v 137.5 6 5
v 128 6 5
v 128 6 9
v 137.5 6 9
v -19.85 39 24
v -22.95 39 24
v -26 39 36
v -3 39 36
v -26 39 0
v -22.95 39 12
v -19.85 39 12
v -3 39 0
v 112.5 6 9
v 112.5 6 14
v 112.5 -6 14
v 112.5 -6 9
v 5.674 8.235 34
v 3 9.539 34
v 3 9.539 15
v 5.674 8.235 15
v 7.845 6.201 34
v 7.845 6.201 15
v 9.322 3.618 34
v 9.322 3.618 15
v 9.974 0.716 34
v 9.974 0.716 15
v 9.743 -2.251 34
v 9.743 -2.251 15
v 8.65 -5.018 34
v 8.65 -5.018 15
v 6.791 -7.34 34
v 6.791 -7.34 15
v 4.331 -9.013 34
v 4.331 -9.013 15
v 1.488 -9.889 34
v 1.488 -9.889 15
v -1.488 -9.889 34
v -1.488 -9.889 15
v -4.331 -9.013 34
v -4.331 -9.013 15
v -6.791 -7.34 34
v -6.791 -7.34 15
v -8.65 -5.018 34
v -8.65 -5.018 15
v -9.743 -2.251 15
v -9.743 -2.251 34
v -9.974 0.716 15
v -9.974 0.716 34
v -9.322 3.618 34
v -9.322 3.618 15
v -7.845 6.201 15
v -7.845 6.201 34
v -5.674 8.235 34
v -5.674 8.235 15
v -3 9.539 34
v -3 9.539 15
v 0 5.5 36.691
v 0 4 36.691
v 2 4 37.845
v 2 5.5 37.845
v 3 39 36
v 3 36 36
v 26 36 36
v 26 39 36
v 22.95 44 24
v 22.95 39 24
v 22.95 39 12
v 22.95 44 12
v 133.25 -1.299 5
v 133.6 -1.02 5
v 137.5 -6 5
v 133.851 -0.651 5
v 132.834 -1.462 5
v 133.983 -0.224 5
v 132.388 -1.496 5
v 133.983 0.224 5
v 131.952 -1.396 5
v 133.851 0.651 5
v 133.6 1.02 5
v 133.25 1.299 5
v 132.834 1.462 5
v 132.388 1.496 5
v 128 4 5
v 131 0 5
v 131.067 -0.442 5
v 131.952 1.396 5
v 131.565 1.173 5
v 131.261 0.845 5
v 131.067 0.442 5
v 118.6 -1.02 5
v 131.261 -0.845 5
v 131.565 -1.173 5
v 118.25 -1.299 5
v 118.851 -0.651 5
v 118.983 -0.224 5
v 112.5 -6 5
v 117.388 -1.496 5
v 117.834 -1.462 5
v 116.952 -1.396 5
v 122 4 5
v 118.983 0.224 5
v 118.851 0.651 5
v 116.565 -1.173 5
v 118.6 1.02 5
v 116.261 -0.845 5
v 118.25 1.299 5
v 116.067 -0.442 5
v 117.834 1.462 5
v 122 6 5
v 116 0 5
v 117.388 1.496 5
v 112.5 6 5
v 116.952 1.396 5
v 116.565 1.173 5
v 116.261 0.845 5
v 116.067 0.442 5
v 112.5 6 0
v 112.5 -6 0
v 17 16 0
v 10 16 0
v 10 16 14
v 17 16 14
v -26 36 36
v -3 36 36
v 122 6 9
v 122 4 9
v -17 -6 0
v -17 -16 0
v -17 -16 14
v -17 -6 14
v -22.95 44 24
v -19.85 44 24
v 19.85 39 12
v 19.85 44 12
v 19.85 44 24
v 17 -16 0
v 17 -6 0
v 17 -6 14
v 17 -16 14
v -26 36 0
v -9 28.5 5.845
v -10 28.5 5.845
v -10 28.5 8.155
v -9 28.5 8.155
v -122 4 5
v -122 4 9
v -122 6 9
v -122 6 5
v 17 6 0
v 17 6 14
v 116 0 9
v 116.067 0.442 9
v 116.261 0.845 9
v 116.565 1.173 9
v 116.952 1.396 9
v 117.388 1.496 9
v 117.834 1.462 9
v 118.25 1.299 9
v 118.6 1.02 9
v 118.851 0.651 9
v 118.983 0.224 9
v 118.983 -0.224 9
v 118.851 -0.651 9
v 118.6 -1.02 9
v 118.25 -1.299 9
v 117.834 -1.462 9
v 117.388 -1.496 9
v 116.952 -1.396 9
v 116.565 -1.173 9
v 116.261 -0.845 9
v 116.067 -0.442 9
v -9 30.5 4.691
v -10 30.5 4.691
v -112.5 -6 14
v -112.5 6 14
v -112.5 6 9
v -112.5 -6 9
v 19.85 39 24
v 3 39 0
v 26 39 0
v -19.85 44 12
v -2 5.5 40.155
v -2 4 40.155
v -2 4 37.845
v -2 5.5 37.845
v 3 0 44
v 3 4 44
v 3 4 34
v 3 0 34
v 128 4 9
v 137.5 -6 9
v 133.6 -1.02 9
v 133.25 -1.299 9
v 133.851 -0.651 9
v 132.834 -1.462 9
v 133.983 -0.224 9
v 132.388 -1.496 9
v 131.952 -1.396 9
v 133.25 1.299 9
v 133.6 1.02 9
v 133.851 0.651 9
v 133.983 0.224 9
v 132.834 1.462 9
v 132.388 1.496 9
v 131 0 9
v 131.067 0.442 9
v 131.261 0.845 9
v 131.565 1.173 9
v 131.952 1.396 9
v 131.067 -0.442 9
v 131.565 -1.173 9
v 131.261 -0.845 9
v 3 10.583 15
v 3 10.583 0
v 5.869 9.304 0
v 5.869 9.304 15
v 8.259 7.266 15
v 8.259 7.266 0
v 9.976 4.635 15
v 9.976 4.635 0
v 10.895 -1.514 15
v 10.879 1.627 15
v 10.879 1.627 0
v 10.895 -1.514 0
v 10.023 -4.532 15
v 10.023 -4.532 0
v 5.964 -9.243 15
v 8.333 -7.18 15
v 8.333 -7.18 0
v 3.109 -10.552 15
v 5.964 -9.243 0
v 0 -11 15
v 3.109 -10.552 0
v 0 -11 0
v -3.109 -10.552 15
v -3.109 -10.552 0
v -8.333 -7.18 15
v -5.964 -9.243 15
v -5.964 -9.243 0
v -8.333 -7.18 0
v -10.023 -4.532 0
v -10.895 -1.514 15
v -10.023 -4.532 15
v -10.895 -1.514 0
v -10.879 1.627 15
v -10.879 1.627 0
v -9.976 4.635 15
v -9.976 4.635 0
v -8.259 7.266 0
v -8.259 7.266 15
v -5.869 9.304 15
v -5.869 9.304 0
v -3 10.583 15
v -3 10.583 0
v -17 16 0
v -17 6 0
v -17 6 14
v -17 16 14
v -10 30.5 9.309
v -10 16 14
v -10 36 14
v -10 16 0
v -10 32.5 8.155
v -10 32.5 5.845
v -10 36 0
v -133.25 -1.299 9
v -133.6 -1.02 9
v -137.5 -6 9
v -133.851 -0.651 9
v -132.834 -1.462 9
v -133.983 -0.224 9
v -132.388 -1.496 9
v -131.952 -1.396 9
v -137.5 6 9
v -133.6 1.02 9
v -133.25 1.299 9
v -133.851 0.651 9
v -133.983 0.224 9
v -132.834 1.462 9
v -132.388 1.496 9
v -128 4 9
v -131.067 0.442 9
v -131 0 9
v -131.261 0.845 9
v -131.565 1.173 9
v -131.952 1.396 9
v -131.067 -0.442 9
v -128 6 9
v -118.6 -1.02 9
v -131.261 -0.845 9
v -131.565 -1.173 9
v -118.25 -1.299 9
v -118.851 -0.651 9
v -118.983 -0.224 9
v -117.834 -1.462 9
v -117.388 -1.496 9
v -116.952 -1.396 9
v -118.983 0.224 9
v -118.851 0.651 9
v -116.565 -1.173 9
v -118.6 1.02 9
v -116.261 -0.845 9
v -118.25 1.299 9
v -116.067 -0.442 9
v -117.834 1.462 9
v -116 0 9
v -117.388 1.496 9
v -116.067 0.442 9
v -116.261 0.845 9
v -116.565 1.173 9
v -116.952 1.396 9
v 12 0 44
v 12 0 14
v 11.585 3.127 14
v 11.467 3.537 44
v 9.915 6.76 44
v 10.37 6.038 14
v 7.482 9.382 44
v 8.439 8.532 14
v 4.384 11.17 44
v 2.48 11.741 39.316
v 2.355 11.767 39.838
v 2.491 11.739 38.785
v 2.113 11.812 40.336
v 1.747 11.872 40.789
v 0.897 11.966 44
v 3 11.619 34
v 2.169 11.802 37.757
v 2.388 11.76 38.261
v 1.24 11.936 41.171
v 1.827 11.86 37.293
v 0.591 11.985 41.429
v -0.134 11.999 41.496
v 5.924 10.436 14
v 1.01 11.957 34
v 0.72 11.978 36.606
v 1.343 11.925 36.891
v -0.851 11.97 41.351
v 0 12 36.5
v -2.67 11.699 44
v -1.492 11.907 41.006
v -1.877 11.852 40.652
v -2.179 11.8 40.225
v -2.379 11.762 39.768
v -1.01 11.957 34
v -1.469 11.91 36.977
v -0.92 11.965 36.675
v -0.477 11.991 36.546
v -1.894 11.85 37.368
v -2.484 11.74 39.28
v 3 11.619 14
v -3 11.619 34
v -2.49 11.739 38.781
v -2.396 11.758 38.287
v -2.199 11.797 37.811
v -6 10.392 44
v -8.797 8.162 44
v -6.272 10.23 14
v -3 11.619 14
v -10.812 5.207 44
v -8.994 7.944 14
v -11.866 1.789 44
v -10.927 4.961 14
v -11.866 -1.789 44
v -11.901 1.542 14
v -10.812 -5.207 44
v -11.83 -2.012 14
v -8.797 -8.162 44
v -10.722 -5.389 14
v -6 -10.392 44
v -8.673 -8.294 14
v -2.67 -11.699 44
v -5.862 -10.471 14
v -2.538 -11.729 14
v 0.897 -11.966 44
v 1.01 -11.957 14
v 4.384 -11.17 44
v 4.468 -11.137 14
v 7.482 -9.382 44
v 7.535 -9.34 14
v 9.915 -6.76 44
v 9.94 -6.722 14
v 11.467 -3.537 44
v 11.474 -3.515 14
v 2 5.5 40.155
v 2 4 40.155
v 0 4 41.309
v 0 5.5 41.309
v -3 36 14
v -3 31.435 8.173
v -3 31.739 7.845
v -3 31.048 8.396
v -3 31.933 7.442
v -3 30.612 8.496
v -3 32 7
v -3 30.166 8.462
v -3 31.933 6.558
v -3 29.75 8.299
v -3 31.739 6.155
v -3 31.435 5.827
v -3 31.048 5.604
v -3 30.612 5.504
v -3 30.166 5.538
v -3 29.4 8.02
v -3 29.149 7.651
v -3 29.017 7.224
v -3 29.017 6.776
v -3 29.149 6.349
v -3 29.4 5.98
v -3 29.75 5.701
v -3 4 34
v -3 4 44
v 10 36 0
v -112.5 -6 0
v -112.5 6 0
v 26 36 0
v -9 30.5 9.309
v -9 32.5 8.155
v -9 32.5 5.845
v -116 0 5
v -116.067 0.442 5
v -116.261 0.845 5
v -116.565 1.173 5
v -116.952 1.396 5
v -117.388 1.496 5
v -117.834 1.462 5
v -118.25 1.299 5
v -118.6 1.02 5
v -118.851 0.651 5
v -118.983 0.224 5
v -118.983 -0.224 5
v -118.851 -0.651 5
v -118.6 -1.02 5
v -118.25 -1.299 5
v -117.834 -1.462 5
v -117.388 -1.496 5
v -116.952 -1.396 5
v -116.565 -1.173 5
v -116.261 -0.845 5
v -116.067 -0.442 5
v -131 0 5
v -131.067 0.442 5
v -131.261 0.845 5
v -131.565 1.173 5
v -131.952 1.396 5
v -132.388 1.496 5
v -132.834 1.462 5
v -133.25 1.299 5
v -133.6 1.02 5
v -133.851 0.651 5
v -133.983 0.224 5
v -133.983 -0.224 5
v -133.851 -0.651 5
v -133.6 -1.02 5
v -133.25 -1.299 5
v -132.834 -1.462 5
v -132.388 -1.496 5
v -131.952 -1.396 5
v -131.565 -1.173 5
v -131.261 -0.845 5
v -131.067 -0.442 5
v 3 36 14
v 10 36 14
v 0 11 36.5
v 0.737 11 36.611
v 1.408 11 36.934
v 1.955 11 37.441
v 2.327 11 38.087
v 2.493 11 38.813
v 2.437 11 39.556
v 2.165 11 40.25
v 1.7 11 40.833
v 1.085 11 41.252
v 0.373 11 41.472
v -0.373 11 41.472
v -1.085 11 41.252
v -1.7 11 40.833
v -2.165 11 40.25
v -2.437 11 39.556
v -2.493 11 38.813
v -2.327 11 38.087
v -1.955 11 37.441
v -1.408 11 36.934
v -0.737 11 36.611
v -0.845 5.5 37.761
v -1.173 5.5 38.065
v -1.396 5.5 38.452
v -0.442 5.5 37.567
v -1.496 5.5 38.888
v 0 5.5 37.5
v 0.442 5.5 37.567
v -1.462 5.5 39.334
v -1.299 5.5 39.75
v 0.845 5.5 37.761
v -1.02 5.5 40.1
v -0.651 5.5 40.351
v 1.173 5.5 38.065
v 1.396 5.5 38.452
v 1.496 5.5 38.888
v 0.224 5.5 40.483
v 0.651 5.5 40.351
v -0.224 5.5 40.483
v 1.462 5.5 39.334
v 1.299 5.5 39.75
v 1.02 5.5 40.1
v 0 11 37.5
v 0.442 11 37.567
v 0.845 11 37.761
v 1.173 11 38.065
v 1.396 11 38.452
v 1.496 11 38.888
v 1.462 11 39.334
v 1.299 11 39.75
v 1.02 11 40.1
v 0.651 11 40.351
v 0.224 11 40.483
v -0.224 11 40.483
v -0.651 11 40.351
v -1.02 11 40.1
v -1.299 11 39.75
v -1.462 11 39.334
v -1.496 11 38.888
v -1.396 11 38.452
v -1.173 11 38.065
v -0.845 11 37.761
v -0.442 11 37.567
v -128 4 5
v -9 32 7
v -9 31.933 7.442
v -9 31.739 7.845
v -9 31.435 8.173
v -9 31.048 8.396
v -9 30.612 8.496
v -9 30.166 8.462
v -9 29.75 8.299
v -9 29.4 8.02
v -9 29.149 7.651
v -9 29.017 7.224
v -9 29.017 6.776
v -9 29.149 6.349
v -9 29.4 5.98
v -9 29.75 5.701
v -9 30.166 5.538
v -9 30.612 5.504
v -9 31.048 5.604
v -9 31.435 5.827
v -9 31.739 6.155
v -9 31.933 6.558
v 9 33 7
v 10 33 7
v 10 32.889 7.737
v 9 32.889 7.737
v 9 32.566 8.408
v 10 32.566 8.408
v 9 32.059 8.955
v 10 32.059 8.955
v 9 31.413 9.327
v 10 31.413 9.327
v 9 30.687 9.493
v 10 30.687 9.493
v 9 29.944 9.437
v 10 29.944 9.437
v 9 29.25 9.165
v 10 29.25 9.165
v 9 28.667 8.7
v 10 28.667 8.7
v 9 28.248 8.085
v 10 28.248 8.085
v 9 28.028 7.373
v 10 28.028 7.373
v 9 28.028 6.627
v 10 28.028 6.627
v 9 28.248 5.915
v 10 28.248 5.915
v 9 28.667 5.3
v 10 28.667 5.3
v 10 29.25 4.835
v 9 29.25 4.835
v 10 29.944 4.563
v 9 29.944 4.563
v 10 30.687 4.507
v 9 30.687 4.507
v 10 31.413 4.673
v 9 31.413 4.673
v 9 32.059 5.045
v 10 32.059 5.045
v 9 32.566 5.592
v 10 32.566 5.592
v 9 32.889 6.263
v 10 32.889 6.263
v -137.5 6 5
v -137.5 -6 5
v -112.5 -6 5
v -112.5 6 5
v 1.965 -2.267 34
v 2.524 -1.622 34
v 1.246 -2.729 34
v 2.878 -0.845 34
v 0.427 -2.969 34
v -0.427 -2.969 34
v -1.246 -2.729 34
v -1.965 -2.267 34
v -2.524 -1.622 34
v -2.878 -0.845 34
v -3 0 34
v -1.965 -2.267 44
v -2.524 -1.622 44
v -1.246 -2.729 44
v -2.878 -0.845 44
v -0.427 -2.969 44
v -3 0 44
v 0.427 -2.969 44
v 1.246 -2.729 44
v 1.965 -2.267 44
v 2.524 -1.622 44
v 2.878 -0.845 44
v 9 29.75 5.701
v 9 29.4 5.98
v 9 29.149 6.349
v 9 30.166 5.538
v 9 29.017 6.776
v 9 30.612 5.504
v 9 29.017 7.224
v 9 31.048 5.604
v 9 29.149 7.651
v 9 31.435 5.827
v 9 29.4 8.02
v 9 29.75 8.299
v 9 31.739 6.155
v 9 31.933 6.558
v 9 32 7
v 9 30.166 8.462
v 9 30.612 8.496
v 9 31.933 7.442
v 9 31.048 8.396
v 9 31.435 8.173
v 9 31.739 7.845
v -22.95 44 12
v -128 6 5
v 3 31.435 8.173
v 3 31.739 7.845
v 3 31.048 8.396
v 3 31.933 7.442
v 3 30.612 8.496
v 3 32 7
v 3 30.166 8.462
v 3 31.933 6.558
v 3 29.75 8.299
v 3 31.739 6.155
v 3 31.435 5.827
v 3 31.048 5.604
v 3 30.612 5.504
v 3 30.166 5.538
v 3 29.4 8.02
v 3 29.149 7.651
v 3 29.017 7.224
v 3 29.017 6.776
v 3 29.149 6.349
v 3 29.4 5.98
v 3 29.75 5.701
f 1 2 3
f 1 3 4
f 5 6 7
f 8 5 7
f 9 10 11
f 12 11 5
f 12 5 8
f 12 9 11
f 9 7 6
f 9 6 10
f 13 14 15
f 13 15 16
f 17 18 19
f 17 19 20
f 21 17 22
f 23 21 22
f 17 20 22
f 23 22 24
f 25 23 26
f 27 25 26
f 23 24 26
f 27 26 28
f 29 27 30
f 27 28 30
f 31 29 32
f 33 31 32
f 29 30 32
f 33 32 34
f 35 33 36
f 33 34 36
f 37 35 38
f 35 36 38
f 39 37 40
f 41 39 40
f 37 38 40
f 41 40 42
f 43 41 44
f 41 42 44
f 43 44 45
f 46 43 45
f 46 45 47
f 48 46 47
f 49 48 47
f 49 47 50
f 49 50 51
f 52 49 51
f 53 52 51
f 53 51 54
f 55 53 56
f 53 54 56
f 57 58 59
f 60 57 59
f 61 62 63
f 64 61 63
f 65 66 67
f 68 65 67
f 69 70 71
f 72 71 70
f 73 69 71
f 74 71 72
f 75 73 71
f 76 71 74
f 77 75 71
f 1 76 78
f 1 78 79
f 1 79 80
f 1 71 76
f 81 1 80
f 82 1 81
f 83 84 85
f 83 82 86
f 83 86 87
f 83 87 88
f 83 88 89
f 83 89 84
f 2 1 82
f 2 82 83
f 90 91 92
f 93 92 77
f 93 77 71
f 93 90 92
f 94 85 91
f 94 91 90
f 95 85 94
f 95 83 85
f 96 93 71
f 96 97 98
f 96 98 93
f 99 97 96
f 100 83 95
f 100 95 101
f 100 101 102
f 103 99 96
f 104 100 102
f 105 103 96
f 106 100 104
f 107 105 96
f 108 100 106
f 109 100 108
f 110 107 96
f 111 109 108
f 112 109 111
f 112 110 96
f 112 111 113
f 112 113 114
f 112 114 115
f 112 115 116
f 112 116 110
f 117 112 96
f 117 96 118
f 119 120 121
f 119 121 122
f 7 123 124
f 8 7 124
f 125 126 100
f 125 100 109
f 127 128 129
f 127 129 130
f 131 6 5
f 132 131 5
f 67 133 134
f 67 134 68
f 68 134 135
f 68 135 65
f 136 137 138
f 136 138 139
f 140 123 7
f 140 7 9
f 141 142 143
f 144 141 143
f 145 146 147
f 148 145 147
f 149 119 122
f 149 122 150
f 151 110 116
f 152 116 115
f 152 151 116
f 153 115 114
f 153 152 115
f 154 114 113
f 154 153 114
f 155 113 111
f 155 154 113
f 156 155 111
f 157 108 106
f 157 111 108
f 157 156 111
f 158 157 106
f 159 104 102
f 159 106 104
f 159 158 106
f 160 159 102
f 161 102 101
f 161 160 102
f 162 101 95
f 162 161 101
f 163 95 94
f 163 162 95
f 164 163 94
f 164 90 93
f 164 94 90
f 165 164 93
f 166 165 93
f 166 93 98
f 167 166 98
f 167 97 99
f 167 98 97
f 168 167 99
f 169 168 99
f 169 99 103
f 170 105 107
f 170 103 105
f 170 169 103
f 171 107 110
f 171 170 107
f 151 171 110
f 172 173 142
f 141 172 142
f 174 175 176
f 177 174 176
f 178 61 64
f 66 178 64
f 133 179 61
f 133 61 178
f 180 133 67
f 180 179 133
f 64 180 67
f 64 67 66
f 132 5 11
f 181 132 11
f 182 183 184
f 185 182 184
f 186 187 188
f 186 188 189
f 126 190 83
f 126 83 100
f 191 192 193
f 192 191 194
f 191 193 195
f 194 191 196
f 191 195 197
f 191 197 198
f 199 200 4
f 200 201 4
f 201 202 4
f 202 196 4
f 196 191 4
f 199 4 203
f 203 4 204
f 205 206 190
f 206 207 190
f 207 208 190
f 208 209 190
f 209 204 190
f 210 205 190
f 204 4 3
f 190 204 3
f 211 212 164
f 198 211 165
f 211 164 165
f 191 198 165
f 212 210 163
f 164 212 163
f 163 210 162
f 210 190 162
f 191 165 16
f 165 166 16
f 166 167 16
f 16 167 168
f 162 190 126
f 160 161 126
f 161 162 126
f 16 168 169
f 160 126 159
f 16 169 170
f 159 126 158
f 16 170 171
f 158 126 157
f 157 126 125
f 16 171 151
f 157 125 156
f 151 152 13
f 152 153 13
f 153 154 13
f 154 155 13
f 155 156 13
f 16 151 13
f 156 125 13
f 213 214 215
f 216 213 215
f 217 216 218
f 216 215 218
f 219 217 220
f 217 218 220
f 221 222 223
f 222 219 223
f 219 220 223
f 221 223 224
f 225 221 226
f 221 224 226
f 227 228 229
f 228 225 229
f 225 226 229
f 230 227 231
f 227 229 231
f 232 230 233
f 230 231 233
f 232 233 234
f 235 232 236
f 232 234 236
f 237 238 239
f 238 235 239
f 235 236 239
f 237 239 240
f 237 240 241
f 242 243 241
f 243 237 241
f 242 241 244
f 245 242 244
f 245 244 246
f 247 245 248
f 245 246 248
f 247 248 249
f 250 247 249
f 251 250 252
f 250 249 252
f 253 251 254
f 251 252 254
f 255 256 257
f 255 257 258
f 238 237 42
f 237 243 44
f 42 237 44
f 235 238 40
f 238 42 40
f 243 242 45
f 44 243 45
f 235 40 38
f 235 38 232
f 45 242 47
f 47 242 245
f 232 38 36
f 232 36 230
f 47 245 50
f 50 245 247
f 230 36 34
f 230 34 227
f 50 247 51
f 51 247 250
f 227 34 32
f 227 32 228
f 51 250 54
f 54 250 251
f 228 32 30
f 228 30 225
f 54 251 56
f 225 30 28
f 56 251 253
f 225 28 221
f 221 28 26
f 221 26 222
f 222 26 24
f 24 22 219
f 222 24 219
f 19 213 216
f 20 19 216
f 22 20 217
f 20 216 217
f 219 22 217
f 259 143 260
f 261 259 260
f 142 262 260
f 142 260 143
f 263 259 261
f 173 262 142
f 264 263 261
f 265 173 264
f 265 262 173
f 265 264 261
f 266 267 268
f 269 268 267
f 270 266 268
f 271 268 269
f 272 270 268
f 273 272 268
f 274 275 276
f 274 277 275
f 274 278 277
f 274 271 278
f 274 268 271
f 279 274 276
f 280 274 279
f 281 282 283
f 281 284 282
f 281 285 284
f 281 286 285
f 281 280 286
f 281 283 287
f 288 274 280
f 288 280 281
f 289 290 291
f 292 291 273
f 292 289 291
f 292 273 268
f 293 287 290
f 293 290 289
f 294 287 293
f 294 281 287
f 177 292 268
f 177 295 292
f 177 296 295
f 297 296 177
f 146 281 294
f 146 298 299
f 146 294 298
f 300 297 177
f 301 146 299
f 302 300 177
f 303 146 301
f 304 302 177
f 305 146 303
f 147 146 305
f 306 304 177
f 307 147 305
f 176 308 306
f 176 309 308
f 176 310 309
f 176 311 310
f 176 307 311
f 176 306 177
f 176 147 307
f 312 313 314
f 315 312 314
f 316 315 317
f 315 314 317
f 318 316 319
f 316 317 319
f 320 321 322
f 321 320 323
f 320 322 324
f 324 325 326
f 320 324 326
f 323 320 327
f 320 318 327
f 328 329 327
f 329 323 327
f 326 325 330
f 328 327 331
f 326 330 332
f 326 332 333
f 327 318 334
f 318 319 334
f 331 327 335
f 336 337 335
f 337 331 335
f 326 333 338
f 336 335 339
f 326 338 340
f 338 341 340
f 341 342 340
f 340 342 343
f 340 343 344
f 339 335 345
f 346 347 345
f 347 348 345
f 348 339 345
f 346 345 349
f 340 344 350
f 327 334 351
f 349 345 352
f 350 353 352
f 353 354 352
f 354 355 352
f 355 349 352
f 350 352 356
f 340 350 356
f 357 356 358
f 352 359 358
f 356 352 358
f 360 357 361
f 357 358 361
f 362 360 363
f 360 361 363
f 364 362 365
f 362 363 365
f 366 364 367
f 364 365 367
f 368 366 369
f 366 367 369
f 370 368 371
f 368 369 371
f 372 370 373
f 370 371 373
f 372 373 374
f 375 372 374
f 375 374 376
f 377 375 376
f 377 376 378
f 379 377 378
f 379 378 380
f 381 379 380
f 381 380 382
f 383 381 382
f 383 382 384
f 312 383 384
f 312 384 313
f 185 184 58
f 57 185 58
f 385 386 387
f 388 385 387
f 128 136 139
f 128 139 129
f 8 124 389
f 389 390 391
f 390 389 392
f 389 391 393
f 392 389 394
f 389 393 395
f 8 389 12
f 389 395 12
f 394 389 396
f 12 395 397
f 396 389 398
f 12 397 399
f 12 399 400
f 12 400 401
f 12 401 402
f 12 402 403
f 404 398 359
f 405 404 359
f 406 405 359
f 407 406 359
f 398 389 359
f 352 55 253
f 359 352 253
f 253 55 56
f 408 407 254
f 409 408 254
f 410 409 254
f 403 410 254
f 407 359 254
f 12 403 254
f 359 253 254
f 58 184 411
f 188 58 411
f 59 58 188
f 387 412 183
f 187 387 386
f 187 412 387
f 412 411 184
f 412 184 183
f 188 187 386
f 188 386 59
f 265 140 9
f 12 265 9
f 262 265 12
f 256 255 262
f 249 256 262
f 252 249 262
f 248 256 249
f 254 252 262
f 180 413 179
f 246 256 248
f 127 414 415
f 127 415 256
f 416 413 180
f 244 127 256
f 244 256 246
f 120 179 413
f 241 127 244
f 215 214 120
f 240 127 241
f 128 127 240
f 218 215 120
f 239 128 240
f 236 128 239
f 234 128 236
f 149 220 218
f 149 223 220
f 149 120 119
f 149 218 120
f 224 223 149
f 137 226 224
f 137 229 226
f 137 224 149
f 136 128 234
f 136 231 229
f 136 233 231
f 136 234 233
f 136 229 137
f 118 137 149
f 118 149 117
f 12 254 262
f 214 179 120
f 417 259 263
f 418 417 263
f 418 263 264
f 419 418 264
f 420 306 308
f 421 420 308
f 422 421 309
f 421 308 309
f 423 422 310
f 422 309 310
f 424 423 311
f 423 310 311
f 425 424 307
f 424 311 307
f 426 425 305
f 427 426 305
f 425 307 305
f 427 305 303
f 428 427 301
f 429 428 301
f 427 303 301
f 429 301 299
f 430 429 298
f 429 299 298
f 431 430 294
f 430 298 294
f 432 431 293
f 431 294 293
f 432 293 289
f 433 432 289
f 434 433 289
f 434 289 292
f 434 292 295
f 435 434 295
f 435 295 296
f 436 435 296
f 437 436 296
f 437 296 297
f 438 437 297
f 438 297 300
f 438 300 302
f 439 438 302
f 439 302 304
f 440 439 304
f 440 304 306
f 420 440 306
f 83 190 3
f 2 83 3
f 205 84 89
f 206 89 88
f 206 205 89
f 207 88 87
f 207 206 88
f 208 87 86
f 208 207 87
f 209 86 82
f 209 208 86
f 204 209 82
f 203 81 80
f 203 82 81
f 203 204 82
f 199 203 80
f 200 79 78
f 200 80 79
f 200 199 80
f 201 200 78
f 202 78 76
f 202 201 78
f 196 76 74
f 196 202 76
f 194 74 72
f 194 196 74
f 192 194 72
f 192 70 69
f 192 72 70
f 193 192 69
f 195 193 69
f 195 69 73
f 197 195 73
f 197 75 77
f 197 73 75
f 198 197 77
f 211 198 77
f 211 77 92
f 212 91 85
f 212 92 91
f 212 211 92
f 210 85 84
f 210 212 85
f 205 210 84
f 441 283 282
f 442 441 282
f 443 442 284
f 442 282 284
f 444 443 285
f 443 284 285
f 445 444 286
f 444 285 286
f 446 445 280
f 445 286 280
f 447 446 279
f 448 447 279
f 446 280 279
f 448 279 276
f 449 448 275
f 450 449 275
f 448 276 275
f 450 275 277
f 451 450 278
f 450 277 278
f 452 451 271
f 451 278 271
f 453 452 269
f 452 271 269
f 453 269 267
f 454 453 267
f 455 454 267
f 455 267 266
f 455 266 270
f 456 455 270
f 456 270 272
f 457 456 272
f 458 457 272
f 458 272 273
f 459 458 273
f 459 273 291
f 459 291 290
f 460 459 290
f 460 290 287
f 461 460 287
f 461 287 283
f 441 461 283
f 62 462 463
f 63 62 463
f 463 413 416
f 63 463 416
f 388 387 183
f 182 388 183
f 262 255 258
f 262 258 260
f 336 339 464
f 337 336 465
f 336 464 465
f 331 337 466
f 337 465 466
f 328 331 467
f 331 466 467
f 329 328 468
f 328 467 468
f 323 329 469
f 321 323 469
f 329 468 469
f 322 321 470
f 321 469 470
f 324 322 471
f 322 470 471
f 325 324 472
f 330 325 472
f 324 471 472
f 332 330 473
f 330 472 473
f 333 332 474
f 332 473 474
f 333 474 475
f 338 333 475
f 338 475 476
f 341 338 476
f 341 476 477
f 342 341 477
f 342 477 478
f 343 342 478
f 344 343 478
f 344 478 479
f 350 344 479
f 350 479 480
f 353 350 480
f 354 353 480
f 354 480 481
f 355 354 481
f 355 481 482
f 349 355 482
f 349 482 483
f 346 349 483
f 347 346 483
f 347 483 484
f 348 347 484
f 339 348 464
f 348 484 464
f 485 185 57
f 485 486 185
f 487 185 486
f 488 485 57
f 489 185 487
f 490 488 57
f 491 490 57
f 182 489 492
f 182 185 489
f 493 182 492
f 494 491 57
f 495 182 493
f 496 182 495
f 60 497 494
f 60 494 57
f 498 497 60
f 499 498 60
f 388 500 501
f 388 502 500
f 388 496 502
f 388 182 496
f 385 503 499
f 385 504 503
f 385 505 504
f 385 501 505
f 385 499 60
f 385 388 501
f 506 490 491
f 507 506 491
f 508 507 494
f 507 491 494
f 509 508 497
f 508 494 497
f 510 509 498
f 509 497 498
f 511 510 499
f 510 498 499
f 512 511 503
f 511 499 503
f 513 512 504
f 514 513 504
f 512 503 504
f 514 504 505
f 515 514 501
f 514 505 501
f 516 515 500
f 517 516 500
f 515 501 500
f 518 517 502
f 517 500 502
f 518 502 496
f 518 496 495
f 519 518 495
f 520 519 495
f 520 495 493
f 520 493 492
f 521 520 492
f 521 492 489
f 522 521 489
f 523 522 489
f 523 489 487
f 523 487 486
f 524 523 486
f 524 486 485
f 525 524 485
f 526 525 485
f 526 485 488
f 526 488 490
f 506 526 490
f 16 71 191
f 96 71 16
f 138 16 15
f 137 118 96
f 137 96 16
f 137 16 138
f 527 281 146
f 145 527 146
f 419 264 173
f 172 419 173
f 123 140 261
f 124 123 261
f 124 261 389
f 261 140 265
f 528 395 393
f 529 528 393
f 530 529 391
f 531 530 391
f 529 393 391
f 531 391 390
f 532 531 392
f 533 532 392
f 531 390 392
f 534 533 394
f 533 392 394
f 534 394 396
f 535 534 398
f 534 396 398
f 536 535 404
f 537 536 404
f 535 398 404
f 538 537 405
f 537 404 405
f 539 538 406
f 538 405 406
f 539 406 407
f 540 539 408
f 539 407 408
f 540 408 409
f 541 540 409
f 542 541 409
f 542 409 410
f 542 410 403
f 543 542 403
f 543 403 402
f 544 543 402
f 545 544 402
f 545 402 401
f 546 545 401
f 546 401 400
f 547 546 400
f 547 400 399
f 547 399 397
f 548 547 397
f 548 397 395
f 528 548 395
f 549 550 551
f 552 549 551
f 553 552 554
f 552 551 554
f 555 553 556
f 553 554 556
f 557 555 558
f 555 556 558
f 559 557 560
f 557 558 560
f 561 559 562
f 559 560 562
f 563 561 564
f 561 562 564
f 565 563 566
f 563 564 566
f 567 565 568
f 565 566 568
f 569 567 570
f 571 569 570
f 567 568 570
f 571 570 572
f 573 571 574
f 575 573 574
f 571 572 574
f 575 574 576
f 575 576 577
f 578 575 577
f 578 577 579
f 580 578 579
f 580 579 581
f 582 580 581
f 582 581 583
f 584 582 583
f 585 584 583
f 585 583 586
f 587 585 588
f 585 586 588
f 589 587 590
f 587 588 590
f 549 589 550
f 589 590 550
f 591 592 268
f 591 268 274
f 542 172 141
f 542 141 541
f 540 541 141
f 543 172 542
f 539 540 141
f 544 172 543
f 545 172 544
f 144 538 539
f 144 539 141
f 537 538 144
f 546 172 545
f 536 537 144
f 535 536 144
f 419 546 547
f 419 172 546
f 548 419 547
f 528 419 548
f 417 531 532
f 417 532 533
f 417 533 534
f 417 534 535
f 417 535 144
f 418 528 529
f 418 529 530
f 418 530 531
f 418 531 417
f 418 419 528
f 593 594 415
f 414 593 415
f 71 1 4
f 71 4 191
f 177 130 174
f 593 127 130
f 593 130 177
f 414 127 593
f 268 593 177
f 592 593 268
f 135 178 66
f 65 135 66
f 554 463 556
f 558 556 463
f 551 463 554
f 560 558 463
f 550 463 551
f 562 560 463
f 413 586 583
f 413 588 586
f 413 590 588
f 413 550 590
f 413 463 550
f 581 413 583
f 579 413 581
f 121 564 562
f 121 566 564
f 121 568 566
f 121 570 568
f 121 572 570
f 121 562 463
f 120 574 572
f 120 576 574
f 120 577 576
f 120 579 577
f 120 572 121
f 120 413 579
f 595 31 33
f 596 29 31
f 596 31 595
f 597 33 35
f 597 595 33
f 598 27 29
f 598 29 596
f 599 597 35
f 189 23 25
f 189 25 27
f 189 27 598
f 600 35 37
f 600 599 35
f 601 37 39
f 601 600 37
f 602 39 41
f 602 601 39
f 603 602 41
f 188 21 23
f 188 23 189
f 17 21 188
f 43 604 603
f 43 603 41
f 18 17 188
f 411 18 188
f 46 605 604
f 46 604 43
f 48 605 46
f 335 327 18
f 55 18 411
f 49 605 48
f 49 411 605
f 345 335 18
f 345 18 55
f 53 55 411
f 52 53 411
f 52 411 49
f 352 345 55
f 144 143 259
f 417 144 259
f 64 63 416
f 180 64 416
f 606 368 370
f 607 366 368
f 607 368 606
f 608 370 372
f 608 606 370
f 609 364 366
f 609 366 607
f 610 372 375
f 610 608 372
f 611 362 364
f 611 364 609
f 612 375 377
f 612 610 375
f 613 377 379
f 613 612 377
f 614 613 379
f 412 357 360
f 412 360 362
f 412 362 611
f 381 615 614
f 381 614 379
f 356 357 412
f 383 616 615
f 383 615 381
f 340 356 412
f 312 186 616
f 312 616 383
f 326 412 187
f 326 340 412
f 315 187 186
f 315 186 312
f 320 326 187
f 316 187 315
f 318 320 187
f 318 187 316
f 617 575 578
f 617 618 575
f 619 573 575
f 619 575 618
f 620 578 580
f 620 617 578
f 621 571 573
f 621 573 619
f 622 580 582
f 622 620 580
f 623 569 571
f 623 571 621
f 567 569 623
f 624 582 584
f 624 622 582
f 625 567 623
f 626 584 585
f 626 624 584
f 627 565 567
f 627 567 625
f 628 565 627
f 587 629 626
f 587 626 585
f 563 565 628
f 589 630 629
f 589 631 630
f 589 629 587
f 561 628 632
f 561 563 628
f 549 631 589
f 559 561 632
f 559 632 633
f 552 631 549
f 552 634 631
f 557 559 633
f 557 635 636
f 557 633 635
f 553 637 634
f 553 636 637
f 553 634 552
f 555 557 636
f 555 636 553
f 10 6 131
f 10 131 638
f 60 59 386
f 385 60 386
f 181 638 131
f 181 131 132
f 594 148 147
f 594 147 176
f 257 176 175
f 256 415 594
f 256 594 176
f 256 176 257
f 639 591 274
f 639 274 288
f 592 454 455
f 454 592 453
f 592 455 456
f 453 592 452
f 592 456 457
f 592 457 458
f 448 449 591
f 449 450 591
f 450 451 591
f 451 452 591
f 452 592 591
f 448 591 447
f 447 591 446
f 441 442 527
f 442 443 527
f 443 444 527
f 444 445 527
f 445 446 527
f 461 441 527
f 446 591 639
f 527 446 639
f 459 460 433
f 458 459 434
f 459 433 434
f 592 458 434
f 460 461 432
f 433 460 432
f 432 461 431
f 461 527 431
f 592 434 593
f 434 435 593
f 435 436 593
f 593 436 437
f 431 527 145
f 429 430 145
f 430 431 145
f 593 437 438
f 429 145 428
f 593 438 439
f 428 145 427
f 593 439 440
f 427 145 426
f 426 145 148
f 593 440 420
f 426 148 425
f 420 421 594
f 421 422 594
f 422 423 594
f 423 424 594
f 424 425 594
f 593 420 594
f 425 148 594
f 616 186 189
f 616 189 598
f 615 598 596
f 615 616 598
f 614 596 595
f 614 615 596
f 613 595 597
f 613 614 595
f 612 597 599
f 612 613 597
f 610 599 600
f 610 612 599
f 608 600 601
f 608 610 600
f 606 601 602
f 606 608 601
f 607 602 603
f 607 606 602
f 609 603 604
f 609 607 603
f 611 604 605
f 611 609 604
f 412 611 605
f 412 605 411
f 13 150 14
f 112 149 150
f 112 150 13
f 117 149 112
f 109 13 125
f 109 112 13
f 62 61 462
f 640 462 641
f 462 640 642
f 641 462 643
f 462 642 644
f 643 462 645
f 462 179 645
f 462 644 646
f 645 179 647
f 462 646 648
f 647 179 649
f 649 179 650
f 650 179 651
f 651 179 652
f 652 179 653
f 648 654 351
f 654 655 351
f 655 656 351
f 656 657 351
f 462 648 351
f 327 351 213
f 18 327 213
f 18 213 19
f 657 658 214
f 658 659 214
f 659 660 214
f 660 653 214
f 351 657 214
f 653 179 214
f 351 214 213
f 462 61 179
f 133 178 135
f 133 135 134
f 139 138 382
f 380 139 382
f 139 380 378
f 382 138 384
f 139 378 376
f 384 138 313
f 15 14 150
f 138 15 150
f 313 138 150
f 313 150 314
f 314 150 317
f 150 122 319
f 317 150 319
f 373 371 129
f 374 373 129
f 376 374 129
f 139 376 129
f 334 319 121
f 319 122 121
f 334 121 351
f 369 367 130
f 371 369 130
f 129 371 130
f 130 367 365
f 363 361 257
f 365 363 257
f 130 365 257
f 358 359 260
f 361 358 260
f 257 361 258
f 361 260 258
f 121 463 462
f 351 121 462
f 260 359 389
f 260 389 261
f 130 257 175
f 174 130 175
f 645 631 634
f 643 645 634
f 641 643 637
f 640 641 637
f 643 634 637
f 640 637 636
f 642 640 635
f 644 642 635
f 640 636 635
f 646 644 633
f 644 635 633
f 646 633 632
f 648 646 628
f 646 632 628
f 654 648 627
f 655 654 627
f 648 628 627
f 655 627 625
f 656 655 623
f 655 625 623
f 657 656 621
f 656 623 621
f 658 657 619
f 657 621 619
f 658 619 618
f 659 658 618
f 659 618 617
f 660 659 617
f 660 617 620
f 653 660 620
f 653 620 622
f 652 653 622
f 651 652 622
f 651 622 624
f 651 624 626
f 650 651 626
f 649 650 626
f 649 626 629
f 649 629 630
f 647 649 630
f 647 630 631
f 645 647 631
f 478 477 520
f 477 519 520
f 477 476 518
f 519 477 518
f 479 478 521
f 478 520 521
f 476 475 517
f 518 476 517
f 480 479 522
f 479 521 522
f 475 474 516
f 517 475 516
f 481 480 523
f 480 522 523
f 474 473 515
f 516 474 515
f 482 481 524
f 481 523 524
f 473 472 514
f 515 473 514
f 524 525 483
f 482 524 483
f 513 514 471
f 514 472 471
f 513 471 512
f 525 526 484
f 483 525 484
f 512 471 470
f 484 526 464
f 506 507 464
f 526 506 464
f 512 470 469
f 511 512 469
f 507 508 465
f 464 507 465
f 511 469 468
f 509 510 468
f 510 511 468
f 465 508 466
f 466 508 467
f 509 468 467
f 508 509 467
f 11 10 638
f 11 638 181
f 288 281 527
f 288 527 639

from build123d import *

# Parameters (mm, degrees)
BOSS_EXTRUDE1_DEPTH = 14
SKETCH2_R           = 12
BOSS_EXTRUDE2_DEPTH = 30
CUT_EXTRUDE2_DEPTH  = 34
BOSS_EXTRUDE3_START = 19
BOSS_EXTRUDE3_DEPTH = 19
CUT_EXTRUDE3_DEPTH  = 149.789280528
SKETCH10_R          = 1.5
CUT_EXTRUDE5_DEPTH  = 148.87241122
CUT_EXTRUDE6_DEPTH  = 1.5
CUT_EXTRUDE7_REACH  = 160.077
SKETCH12_R          = 1.5
SKETCH13_R          = 2.5
CUT_EXTRUDE8_DEPTH  = 1
CUT_EXTRUDE9_DEPTH  = 1
SKETCH15_W          = 25
SKETCH15_H          = 5
CUT_EXTRUDE11_DEPTH = 148.452534766
CUT_EXTRUDE12_START = -5.5
SKETCH17_R          = 2.5
CUT_EXTRUDE12_DEPTH = 143.055074494
SKETCH18_W          = 23
SKETCH18_H          = 36
BOSS_EXTRUDE7_DEPTH = 3
SKETCH19_W          = 3.1
SKETCH19_H          = 12
BOSS_EXTRUDE8_DEPTH = 5
SKETCH21_R          = 1.5
SKETCH21_W          = 6
SKETCH21_H          = 2
CUT_EXTRUDE13_DEPTH = 149.550496489


with BuildPart() as part:
    # Sketch1 → Boss-Extrude1 (new body)
    with BuildSketch(Plane.XY):
        Polygon((10, 16), (17, 16), (17, 6), (137.5, 6), (137.5, -6), (17, -6), (17, -16), (-17, -16), (-17, -6), (-137.5, -6), (-137.5, 6), (-17, 6), (-17, 16), (-10, 16), (-10, 36), (10, 36), align=None)
    extrude(amount=BOSS_EXTRUDE1_DEPTH)

    # Sketch2 → Boss-Extrude2 (add)
    with BuildSketch(Plane.XY.offset(14)):
        Circle(SKETCH2_R)
    extrude(amount=BOSS_EXTRUDE2_DEPTH)

    # Sketch5 → Cut-Extrude2 (cut)
    with BuildSketch(Plane(origin=(0, 0, 0), x_dir=(-1, 0, 0), z_dir=(0, 0, -1))):
        with BuildLine():
            Line((-3, 36), (-3, 10.583005244))
            ThreePointArc((-3, 10.583005244), (0, -11), (3, 10.583005244))
            Line((3, 10.583005244), (3, 36))
            Line((3, 36), (-3, 36))
        make_face()
    extrude(amount=-CUT_EXTRUDE2_DEPTH, mode=Mode.SUBTRACT)

    # Sketch7 → Boss-Extrude3 (add)
    with BuildSketch(Plane(origin=(0, 0, 34), x_dir=(-1, 0, 0), z_dir=(0, 0, -1)).offset(BOSS_EXTRUDE3_START)):
        with BuildLine():
            Line((-3, 10.583005244), (-3, 9.539392014))
            ThreePointArc((-3, 9.539392014), (0, -10), (3, 9.539392014))
            Line((3, 9.539392014), (3, 10.583005244))
            ThreePointArc((3, 10.583005244), (0, -11), (-3, 10.583005244))
        make_face()
    extrude(amount=-BOSS_EXTRUDE3_DEPTH)

    # Sketch6 → Cut-Extrude3 (cut, through all)
    with BuildSketch(Plane.XY.offset(44)):
        with BuildLine():
            Line((-3, 0), (-3, 4))
            Line((-3, 4), (3, 4))
            Line((3, 4), (3, 0))
            ThreePointArc((3, 0), (0, -3), (-3, 0))
        make_face()
    extrude(amount=-CUT_EXTRUDE3_DEPTH, mode=Mode.SUBTRACT)

    # Sketch10 → Cut-Extrude5 (cut, through all)
    with BuildSketch(Plane(origin=(0, 4, 0), x_dir=(-1, 0, 0), z_dir=(0, -1, 0))):
        with Locations(Location((0, -39, 0), (0, 0, 90))):
            Circle(SKETCH10_R)
    extrude(amount=-CUT_EXTRUDE5_DEPTH, mode=Mode.SUBTRACT)

    # Sketch11 → Cut-Extrude6 (cut)
    with BuildSketch(Plane.XZ.offset(-4)):
        Polygon((2, 37.845299462), (2, 40.154700538), (0, 41.309401077), (-2, 40.154700538), (-2, 37.845299462), (0, 36.690598923), align=None)
    extrude(amount=-CUT_EXTRUDE6_DEPTH, mode=Mode.SUBTRACT)

    # Cut-Extrude7: up to this face of the body (flat: up to its plane)
    cut_extrude7_end = Plane(part.part.faces().sort_by_distance((-10, 26, 7))[0])
    # Sketch12 → Cut-Extrude7 (cut, up to the picked face)
    with BuildSketch(Plane(origin=(10, 0, 0), x_dir=(0, 0, -1), z_dir=(1, 0, 0)), mode=Mode.PRIVATE) as cut_extrude7_sk1:
        with Locations(Location((-7, 30.5, 0), (0, 0, 90))):
            Circle(SKETCH12_R)
    cut_extrude7_tool1 = split(extrude(cut_extrude7_sk1.sketch, amount=-CUT_EXTRUDE7_REACH, mode=Mode.PRIVATE), bisect_by=cut_extrude7_end, keep=Keep.BOTH, mode=Mode.PRIVATE)
    add(cut_extrude7_tool1.solids().sort_by(Axis((10, 30.5, 7), (-1, 0, 0)))[0], mode=Mode.SUBTRACT)

    # Sketch13 → Cut-Extrude8 (cut)
    with BuildSketch(Plane(origin=(10, 0, 0), x_dir=(0, 0, -1), z_dir=(1, 0, 0))):
        with Locations(Location((-7, 30.5, 0), (0, 0, 90))):
            Circle(SKETCH13_R)
    extrude(amount=-CUT_EXTRUDE8_DEPTH, mode=Mode.SUBTRACT)

    # Sketch14 → Cut-Extrude9 (cut)
    with BuildSketch(Plane.ZY.offset(10)):
        Polygon((4.690598923, 30.5), (5.845299462, 28.5), (8.154700538, 28.5), (9.309401077, 30.5), (8.154700538, 32.5), (5.845299462, 32.5), align=None)
    extrude(amount=-CUT_EXTRUDE9_DEPTH, mode=Mode.SUBTRACT)

    # Sketch15 → Cut-Extrude11 (cut, through all)
    with BuildSketch(Plane(origin=(0, 6, 0), x_dir=(1, 0, 0), z_dir=(0, 1, 0))):
        with Locations((-125, -11.5)):
            Rectangle(SKETCH15_W, SKETCH15_H)
        with Locations((-125, -2.5)):
            Rectangle(SKETCH15_W, SKETCH15_H)
    cut_extrude11 = extrude(amount=-CUT_EXTRUDE11_DEPTH, mode=Mode.SUBTRACT)

    # Mirror2: Cut-Extrude11 across plane
    add(cut_extrude11.mirror(Plane(origin=(0, 0, 0), x_dir=(0, 0, 1), z_dir=(1, 0, 0))), mode=Mode.SUBTRACT)

    # Sketch17 → Cut-Extrude12 (cut, through all)
    with BuildSketch(Plane.XZ.offset(-5.5).offset(CUT_EXTRUDE12_START)):
        with Locations(Location((0, 39, 0), (0, 0, 270))):
            Circle(SKETCH17_R)
    extrude(amount=-CUT_EXTRUDE12_DEPTH, mode=Mode.SUBTRACT)

    # Sketch18 → Boss-Extrude7 (add)
    with BuildSketch(Plane(origin=(0, 36, 0), x_dir=(1, 0, 0), z_dir=(0, 1, 0))):
        with Locations((-14.5, -18)):
            Rectangle(SKETCH18_W, SKETCH18_H)
        with Locations((14.5, -18)):
            Rectangle(SKETCH18_W, SKETCH18_H)
    extrude(amount=BOSS_EXTRUDE7_DEPTH)

    # Sketch19 → Boss-Extrude8 (add)
    with BuildSketch(Plane(origin=(0, 39, 0), x_dir=(1, 0, 0), z_dir=(0, 1, 0))):
        with Locations((-21.4, -18)):
            Rectangle(SKETCH19_W, SKETCH19_H)
        with Locations((21.4, -18)):
            Rectangle(SKETCH19_W, SKETCH19_H)
    extrude(amount=BOSS_EXTRUDE8_DEPTH)

    # Sketch21 → Cut-Extrude13 (cut, through all)
    with BuildSketch(Plane.XY.offset(9)):
        with Locations((-132.5, 0)):
            Circle(SKETCH21_R)
        with Locations((-117.5, 0)):
            Circle(SKETCH21_R)
        with Locations((-125, 5)):
            Rectangle(SKETCH21_W, SKETCH21_H)
    cut_extrude13 = extrude(amount=-CUT_EXTRUDE13_DEPTH, mode=Mode.SUBTRACT)

    # Mirror3: Cut-Extrude13 across plane
    add(cut_extrude13.mirror(Plane(origin=(0, 0, 0), x_dir=(0, 0, 1), z_dir=(1, 0, 0))), mode=Mode.SUBTRACT)


solid = part.part
